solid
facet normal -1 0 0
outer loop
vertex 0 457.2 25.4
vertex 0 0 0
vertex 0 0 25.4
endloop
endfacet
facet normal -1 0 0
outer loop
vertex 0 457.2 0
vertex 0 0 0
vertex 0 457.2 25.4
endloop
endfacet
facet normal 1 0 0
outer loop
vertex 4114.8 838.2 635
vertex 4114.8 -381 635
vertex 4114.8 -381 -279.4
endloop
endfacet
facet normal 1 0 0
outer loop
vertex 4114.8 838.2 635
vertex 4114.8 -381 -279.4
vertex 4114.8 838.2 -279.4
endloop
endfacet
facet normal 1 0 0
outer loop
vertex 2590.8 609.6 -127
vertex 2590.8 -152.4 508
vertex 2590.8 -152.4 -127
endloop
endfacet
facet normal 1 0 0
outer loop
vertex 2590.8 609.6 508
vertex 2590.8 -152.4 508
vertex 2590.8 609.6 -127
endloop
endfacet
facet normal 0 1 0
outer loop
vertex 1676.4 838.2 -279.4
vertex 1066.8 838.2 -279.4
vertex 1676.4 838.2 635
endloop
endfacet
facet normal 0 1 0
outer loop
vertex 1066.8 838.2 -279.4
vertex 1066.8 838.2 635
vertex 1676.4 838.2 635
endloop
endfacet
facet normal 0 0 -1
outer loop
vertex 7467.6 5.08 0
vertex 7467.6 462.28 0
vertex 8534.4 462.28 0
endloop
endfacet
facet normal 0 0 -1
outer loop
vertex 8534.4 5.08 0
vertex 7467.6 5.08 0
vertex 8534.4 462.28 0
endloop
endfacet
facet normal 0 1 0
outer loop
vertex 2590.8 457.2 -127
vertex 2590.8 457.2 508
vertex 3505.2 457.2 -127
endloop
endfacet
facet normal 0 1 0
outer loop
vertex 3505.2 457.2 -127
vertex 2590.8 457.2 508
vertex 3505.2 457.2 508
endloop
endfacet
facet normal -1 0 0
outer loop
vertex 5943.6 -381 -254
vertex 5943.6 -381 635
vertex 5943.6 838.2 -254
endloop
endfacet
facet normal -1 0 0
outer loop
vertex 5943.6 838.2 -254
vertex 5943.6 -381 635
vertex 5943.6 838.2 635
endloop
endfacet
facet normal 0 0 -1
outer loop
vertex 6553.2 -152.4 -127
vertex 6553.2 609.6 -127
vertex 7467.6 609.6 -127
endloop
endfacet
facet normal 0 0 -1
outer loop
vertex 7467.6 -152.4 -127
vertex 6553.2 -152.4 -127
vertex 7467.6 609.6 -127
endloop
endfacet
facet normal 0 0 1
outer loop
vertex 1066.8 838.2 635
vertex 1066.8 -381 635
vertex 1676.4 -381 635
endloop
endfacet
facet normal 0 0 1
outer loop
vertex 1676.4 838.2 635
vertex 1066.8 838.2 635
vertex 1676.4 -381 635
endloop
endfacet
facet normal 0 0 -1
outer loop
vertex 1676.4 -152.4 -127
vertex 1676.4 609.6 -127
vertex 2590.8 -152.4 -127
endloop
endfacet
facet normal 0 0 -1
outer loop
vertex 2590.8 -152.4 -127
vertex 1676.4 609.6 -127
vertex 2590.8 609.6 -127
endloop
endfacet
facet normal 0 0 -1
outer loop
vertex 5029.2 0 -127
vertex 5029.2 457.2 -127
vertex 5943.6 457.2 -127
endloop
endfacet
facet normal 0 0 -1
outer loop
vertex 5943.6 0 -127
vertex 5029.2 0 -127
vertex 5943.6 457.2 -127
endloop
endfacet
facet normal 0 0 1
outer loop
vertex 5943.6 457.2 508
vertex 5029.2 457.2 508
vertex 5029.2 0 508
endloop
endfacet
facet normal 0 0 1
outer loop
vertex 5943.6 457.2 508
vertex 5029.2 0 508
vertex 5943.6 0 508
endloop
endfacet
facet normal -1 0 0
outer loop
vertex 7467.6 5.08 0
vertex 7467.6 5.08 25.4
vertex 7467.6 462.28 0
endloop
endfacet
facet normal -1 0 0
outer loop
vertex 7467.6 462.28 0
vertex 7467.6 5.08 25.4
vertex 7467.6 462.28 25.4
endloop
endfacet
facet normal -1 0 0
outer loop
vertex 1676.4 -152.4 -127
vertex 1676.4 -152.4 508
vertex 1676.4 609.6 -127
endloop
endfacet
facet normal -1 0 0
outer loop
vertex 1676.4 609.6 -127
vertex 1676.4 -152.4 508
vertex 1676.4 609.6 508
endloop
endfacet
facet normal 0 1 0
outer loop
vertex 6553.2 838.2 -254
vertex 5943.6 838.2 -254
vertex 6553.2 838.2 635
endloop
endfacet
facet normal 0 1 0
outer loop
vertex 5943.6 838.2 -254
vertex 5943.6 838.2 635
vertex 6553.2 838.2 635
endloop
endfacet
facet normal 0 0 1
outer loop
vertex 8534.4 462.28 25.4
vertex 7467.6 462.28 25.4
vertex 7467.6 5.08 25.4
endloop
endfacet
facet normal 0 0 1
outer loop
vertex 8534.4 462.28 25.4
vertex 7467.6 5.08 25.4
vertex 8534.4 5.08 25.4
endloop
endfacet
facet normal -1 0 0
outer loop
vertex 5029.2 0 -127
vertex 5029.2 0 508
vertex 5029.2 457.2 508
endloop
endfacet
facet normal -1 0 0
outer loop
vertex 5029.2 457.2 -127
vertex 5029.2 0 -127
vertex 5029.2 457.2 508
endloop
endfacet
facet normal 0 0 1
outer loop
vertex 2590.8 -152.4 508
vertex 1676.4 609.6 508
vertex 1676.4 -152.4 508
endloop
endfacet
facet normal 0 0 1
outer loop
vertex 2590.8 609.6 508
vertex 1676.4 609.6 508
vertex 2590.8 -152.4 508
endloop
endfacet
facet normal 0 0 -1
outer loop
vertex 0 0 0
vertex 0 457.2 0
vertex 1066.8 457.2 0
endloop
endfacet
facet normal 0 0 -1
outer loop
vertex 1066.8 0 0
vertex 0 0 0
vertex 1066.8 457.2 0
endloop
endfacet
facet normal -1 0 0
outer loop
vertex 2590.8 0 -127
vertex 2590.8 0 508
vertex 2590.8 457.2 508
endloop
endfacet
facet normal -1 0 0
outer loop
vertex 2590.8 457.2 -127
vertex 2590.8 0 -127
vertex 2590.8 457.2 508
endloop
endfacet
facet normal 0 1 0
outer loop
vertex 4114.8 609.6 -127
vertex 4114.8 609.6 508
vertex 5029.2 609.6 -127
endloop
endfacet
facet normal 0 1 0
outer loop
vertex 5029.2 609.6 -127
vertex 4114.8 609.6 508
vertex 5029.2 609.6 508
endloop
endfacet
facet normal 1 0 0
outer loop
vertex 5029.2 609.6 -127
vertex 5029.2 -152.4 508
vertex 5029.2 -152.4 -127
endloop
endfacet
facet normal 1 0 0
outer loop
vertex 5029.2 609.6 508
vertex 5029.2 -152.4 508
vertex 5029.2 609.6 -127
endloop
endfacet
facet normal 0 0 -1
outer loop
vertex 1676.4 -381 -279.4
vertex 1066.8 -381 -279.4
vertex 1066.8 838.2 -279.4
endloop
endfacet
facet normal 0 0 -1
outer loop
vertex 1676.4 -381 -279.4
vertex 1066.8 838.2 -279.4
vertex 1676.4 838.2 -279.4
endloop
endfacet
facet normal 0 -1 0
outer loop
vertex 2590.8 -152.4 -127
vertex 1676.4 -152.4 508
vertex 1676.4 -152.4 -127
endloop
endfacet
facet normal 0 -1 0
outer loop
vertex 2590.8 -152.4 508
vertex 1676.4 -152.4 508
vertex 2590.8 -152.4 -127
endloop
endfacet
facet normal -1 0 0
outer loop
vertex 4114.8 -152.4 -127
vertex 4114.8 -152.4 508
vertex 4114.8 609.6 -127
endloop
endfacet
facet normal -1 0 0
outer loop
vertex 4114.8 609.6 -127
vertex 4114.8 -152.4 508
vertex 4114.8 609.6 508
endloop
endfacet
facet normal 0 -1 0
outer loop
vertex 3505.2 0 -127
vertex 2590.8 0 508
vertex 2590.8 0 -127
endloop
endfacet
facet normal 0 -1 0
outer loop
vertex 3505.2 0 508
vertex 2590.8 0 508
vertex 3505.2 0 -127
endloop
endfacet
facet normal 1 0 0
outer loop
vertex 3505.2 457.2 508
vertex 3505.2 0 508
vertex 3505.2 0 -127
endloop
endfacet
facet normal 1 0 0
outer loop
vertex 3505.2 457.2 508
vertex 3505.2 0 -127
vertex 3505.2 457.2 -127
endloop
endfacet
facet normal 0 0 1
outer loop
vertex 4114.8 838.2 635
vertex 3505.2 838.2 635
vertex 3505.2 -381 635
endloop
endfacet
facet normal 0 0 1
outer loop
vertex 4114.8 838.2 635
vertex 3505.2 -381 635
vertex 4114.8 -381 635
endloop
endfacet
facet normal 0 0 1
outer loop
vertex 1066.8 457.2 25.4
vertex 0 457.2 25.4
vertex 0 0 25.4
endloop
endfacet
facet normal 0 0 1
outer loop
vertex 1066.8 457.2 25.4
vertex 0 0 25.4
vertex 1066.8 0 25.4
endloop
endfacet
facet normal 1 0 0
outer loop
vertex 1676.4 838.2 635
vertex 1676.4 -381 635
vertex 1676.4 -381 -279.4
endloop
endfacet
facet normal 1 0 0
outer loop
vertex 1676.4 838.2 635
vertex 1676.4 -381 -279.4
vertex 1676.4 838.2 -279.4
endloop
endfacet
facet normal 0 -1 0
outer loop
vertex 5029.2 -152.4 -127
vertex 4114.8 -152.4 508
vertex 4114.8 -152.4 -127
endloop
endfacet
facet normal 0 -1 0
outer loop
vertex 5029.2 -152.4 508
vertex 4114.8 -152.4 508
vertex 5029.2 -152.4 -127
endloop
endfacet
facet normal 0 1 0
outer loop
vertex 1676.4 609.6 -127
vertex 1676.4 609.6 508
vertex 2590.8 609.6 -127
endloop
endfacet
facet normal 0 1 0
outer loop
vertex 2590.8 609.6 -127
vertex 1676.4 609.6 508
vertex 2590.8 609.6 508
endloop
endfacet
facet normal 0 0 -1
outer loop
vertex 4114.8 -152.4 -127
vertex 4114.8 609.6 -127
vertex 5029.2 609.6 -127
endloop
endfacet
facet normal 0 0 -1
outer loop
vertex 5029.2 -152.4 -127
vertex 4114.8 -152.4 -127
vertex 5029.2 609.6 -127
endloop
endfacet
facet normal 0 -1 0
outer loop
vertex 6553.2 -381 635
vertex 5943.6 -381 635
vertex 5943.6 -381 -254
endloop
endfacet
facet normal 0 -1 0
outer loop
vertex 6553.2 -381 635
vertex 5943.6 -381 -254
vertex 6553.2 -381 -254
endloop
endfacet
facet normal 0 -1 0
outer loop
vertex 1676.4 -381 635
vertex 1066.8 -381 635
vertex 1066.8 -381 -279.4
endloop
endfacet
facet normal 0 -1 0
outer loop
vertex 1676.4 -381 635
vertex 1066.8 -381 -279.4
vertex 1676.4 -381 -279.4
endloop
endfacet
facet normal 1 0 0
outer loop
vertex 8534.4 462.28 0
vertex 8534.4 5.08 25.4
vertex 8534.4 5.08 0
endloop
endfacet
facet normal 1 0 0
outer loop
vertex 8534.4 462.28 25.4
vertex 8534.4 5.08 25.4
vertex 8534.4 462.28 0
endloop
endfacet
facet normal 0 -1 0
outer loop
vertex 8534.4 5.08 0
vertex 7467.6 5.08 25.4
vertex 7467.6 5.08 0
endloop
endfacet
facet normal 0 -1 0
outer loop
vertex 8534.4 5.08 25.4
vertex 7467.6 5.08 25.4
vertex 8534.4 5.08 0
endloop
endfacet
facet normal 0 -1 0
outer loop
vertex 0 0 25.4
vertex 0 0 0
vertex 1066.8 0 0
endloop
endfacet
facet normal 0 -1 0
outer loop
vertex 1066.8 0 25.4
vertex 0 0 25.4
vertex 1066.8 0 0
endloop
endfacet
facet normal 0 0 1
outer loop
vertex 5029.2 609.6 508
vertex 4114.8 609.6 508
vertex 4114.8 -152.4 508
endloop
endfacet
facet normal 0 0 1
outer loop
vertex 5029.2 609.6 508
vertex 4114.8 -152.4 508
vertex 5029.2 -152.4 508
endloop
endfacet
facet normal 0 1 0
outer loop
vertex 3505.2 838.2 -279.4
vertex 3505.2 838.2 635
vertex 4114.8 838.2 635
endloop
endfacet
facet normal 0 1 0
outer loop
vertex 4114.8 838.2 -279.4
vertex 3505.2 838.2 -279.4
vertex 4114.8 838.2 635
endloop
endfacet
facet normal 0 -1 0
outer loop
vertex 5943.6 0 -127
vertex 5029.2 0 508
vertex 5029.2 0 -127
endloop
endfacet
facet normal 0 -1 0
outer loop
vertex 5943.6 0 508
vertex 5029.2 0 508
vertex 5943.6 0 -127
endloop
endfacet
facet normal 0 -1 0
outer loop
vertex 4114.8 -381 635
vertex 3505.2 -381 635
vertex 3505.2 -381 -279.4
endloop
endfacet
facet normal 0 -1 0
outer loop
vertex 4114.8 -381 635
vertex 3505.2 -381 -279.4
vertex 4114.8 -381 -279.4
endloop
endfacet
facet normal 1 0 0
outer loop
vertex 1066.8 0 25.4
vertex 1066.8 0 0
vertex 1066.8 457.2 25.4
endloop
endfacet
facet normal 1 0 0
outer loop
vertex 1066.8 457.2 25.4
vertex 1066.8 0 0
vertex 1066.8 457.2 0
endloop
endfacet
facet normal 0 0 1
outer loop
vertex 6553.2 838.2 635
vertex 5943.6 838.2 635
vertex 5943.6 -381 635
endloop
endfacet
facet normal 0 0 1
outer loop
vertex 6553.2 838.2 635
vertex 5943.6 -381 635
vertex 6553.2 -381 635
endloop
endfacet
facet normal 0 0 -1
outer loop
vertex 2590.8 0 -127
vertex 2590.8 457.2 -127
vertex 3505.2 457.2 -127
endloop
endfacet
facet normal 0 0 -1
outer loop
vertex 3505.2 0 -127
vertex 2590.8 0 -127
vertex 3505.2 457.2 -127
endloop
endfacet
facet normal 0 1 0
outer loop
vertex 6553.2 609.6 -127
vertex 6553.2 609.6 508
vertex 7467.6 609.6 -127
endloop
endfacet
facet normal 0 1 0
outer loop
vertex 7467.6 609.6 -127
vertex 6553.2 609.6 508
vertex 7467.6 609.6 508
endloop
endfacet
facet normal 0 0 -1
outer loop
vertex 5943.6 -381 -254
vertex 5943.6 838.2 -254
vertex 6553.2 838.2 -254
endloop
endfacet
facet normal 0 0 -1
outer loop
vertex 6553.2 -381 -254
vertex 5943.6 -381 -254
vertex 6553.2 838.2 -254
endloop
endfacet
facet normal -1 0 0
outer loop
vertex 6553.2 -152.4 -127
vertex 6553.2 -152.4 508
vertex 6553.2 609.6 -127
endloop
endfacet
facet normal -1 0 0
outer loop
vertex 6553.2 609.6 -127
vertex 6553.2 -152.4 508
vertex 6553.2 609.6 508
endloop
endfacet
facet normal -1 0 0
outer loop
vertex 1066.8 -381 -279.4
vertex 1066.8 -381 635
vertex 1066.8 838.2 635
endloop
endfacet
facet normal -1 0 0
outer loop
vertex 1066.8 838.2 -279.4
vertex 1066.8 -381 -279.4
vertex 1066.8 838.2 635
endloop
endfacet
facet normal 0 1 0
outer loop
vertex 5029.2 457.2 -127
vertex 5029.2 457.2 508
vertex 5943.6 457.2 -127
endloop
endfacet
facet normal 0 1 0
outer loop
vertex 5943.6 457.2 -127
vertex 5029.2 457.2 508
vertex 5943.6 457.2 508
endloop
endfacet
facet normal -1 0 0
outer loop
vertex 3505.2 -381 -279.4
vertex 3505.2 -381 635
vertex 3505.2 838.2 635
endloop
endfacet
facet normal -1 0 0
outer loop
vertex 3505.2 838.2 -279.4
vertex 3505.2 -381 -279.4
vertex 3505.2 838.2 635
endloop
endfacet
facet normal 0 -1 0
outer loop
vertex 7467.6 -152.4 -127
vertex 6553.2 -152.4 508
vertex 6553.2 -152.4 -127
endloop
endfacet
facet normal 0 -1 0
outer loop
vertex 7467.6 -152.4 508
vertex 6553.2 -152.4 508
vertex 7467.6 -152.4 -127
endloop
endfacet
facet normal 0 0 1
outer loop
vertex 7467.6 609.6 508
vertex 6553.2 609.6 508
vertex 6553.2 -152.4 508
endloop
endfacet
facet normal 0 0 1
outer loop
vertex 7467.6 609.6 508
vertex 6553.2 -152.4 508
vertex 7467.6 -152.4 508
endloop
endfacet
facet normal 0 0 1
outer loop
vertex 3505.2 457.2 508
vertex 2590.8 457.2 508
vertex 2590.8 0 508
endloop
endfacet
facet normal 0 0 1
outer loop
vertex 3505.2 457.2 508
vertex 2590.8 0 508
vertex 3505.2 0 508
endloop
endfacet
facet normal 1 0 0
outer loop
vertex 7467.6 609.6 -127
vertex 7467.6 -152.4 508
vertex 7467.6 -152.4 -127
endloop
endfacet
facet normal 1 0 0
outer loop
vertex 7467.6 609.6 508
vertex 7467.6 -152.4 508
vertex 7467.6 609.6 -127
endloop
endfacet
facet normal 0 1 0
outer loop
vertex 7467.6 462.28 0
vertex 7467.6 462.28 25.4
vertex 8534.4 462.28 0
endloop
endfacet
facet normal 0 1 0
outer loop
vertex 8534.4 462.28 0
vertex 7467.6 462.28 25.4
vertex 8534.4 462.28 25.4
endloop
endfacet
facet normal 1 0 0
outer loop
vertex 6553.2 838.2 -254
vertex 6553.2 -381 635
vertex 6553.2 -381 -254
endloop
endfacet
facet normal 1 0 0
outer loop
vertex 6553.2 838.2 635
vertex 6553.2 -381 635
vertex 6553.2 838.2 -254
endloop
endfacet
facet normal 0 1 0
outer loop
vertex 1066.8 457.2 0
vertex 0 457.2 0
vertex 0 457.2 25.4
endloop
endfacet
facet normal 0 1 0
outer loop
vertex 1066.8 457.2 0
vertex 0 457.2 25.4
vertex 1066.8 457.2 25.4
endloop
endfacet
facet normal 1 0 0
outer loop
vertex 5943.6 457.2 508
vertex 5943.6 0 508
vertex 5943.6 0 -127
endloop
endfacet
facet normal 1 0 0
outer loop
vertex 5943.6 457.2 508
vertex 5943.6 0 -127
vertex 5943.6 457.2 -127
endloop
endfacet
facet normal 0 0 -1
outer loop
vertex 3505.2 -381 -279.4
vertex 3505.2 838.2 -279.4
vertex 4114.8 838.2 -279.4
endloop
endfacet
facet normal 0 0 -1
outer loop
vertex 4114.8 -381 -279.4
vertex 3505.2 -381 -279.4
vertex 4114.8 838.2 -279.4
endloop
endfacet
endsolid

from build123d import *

# Parameters (mm, degrees)
F0_W           = 1066.8
F0_H           = 457.2
F1_DEPTH       = 25.4
F2_W           = 609.6
F2_H           = 1219.2
F3_DEPTH       = 609.6
F3_DEPTH_BACK  = 304.8
F5_START       = -127
F4_W           = 914.4
F4_H           = 457.2
F5_DEPTH       = 635
F7_START       = -127
F6_W           = 914.4
F6_H           = 762
F7_DEPTH       = 635
F8_W           = 609.6
F8_H           = 1219.2
F9_DEPTH       = 914.4
F11_START      = -127
F10_W          = 914.4
F10_H          = 762
F11_DEPTH      = 635
F12_W          = 914.4
F12_H          = 457.2
F13_DEPTH      = 635
F14_W          = 609.6
F14_H          = 1219.2
F15_DEPTH      = 127
F15_DEPTH_BACK = 762
F17_START      = -127
F16_W          = 914.4
F16_H          = 762
F17_DEPTH      = 635
F19_START      = -482.6
F18_W          = 1066.8
F18_H          = 457.2
F19_DEPTH      = 25.4


with BuildPart() as f1:
    # F0 (on Top) → F1 (new body)
    with BuildSketch(Plane.XY):
        with Locations((533.4, 228.6)):
            Rectangle(F0_W, F0_H)
    extrude(amount=F1_DEPTH)


with BuildPart() as f3:
    # F2 (on face) → F3 (new body, two sides)
    with BuildSketch(Plane.XY.offset(25.4)) as f3_sk:
        with Locations((1371.6, 228.6)):
            Rectangle(F2_W, F2_H)
    extrude(amount=F3_DEPTH)
    extrude(f3_sk.sketch, amount=-F3_DEPTH_BACK)


with BuildPart() as f5:
    # F4 (on face) → F5 (new body)
    with BuildSketch(Plane.XY.offset(635).offset(F5_START)):
        with Locations((3048, 228.6)):
            Rectangle(F4_W, F4_H)
    extrude(amount=-F5_DEPTH)


with BuildPart() as f7:
    # F6 (on face) → F7 (new body)
    with BuildSketch(Plane.XY.offset(635).offset(F7_START)):
        with Locations((2133.6, 228.6)):
            Rectangle(F6_W, F6_H)
    extrude(amount=-F7_DEPTH)


with BuildPart() as f9:
    # F8 (on face) → F9 (new body)
    with BuildSketch(Plane.XY.offset(635)):
        with Locations((3810, 228.6)):
            Rectangle(F8_W, F8_H)
    extrude(amount=-F9_DEPTH)


with BuildPart() as f11:
    # F10 (on face) → F11 (new body)
    with BuildSketch(Plane.XY.offset(635).offset(F11_START)):
        with Locations((4572, 228.6)):
            Rectangle(F10_W, F10_H)
    extrude(amount=-F11_DEPTH)


with BuildPart() as f13:
    # F12 (on face) → F13 (new body)
    with BuildSketch(Plane.XY.offset(508)):
        with Locations((5486.4, 228.6)):
            Rectangle(F12_W, F12_H)
    extrude(amount=-F13_DEPTH)


with BuildPart() as f15:
    # F14 (on face) → F15 (new body, two sides)
    with BuildSketch(Plane.XY.offset(508)) as f15_sk:
        with Locations((6248.4, 228.6)):
            Rectangle(F14_W, F14_H)
    extrude(amount=F15_DEPTH)
    extrude(f15_sk.sketch, amount=-F15_DEPTH_BACK)


with BuildPart() as f17:
    # F16 (on face) → F17 (new body)
    with BuildSketch(Plane.XY.offset(635).offset(F17_START)):
        with Locations((7010.4, 228.6)):
            Rectangle(F16_W, F16_H)
    extrude(amount=-F17_DEPTH)


with BuildPart() as f19:
    # F18 (on face) → F19 (new body)
    with BuildSketch(Plane.XY.offset(508).offset(F19_START)):
        with Locations((8001, 233.6800000317)):
            Rectangle(F18_W, F18_H)
    extrude(amount=-F19_DEPTH)


solid = Compound([f1.part, f3.part, f5.part, f7.part, f9.part, f11.part, f13.part, f15.part, f17.part, f19.part])
